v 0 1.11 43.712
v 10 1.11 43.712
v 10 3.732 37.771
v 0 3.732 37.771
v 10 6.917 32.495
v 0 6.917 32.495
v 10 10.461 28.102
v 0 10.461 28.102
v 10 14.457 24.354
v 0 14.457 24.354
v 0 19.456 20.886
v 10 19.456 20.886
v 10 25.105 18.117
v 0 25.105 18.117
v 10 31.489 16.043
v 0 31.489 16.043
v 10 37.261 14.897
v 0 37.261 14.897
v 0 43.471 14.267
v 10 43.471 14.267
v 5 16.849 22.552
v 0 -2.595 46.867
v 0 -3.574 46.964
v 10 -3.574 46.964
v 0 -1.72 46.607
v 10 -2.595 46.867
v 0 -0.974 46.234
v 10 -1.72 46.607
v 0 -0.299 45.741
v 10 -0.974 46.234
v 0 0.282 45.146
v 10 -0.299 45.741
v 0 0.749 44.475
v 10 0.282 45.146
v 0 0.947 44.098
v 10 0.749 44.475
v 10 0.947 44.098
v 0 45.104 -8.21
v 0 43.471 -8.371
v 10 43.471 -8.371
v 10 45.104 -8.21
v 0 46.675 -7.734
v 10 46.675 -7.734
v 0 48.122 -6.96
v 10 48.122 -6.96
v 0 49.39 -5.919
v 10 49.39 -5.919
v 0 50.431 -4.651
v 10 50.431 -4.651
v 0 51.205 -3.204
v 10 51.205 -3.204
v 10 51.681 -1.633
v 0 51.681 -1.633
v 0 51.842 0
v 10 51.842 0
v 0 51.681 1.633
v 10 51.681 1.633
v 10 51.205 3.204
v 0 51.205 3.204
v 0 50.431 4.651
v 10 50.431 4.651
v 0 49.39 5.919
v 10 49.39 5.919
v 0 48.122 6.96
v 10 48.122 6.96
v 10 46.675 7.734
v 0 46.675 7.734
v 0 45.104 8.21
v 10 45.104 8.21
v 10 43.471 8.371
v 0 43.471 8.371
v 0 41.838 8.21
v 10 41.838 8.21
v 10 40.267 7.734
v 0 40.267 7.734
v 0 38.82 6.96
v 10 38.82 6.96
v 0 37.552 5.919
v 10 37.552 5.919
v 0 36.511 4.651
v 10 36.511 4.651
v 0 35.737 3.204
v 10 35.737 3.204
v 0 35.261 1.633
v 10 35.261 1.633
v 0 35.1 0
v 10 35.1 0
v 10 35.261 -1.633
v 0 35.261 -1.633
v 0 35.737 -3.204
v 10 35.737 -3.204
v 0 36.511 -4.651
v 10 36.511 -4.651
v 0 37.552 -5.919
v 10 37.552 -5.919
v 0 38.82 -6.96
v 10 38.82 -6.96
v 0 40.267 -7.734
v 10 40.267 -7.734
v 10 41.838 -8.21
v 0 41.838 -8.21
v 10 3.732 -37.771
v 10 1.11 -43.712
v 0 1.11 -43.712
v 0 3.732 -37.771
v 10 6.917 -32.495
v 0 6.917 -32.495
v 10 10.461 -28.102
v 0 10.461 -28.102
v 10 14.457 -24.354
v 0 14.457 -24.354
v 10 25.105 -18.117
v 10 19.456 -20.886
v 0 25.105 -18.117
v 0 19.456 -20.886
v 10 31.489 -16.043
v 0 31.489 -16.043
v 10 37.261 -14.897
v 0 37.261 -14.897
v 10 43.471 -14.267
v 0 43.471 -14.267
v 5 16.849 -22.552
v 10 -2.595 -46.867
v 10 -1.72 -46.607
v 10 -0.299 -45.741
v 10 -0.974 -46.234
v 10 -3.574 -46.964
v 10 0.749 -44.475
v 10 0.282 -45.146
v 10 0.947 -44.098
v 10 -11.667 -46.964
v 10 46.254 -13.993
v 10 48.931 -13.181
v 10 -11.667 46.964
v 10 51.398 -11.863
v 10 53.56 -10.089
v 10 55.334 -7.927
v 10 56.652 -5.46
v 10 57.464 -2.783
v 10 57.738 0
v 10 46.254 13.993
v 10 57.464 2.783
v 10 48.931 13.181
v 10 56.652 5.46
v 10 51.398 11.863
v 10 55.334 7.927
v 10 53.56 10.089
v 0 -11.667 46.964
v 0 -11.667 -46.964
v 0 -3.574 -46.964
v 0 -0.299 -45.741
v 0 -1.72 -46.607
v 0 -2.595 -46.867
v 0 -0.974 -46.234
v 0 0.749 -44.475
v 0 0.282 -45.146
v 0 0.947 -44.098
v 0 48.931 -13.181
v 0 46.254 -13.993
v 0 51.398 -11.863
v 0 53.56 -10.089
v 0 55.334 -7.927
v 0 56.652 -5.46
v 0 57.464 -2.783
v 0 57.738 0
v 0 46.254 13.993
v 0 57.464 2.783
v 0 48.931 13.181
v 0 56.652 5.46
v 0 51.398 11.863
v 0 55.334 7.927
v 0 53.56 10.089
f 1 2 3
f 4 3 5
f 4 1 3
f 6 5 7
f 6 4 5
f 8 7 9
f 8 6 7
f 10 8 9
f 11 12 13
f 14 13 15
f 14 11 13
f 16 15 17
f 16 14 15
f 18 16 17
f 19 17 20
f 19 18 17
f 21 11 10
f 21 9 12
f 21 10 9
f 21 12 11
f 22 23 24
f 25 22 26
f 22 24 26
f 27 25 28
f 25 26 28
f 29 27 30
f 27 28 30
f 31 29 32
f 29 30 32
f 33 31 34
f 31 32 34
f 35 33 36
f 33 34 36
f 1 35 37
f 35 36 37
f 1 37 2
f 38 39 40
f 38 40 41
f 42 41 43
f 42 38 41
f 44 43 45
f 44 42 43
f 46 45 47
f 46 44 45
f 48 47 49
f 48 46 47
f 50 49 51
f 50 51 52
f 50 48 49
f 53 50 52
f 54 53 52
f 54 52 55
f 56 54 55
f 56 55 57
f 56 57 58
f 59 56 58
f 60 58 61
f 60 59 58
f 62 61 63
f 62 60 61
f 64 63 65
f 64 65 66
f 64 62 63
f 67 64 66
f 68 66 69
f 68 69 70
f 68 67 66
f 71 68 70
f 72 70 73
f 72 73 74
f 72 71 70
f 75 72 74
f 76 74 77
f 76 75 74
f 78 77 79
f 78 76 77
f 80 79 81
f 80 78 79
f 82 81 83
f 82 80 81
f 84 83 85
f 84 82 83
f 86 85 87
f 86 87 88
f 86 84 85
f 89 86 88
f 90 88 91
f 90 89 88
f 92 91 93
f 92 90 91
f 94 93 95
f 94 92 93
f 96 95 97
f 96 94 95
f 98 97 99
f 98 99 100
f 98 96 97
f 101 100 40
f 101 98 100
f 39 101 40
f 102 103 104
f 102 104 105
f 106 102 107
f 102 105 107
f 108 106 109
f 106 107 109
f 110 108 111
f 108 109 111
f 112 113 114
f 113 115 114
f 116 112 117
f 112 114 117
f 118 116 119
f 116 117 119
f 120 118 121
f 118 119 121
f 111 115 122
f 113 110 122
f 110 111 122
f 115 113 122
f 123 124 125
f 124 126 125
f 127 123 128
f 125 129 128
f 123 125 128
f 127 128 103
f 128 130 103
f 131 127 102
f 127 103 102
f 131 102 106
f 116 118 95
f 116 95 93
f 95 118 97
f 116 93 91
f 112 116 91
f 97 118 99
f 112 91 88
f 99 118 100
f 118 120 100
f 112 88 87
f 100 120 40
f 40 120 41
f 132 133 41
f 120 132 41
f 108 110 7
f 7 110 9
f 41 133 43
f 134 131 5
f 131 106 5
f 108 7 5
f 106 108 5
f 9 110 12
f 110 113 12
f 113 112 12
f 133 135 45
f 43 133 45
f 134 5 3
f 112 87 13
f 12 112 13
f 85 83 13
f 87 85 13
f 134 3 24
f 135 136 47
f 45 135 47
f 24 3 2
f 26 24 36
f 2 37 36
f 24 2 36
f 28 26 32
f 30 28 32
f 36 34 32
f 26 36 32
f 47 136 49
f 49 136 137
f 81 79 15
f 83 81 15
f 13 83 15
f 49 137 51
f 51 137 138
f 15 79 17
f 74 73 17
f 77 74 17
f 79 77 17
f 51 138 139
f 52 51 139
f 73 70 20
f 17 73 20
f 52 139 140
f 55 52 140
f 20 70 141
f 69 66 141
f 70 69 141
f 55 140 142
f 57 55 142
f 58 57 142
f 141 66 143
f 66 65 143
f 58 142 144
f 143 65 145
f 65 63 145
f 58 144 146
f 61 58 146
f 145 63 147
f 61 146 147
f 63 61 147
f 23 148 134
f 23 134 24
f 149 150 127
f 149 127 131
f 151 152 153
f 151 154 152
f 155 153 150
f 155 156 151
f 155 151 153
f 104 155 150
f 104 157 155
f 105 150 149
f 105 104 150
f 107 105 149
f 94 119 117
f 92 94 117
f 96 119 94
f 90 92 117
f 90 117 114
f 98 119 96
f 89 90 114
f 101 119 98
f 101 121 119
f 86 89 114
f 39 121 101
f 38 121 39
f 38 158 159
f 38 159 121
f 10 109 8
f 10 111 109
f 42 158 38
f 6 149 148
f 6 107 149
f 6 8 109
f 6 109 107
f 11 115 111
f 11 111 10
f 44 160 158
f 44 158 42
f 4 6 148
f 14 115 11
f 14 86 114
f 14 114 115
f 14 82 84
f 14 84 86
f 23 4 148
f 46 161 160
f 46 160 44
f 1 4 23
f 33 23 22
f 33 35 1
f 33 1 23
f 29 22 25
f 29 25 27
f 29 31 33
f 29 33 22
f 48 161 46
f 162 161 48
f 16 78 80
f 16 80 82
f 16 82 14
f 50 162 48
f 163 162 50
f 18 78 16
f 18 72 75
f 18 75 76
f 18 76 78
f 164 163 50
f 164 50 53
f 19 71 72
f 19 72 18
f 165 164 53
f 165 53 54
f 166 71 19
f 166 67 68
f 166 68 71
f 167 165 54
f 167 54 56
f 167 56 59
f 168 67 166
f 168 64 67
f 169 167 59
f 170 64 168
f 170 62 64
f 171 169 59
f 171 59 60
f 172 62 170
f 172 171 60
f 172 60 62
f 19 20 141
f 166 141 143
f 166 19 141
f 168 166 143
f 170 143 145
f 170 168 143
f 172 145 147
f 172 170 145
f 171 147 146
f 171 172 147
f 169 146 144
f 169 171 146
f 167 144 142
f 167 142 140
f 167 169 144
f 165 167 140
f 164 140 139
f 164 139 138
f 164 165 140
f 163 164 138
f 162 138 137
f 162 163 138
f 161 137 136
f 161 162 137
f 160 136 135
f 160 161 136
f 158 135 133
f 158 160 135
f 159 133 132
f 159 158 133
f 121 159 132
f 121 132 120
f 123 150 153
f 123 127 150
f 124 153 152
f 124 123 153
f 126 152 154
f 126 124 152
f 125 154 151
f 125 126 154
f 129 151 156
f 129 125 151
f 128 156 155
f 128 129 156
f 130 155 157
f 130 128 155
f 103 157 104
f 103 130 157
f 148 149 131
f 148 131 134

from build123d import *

# Parameters (mm, degrees)
SKETCH1_R           = 8.371232018
BOSS_EXTRUDE1_DEPTH = 10
FILLET1_R           = 5


with BuildPart() as part:
    # Sketch1 → Boss-Extrude1 (new body)
    with BuildSketch(Plane(origin=(0, 0, 0), x_dir=(0, 0, -1), z_dir=(1, 0, 0))):
        with BuildLine():
            Line((46.963546465, -11.666577207), (-46.963546465, -11.666577207))
            Line((-46.963546465, -11.666577207), (-46.963546465, 0))
            add(Edge.make_bspline(
                [(-46.963546465, 0), (-16.221096815, 9.567463223), (-14.267406521, 43.471004243)],
                knots=[0, 0, 0, 1, 1, 1], degree=2))
            ThreePointArc((-14.267406521, 43.471004243), (0, 57.738410764), (14.267406521, 43.471004243))
            add(Edge.make_bspline(
                [(46.963546465, 0), (16.221096815, 9.567463223), (14.267406521, 43.471004243)],
                knots=[0, 0, 0, 1, 1, 1], degree=2))
            Line((46.963546465, 0), (46.963546465, -11.666577207))
        make_face()
        with Locations((0, 43.471004243)):
            Circle(SKETCH1_R, mode=Mode.SUBTRACT)
    extrude(amount=BOSS_EXTRUDE1_DEPTH)

    # Fillet1
    fillet1_edges = [part.edges().sort_by_distance(p)[0] for p in [
        (5, 0, 46.963546465),
        (5, 0, -46.963546465),
    ]]
    fillet(fillet1_edges, radius=FILLET1_R)


solid = part.part
